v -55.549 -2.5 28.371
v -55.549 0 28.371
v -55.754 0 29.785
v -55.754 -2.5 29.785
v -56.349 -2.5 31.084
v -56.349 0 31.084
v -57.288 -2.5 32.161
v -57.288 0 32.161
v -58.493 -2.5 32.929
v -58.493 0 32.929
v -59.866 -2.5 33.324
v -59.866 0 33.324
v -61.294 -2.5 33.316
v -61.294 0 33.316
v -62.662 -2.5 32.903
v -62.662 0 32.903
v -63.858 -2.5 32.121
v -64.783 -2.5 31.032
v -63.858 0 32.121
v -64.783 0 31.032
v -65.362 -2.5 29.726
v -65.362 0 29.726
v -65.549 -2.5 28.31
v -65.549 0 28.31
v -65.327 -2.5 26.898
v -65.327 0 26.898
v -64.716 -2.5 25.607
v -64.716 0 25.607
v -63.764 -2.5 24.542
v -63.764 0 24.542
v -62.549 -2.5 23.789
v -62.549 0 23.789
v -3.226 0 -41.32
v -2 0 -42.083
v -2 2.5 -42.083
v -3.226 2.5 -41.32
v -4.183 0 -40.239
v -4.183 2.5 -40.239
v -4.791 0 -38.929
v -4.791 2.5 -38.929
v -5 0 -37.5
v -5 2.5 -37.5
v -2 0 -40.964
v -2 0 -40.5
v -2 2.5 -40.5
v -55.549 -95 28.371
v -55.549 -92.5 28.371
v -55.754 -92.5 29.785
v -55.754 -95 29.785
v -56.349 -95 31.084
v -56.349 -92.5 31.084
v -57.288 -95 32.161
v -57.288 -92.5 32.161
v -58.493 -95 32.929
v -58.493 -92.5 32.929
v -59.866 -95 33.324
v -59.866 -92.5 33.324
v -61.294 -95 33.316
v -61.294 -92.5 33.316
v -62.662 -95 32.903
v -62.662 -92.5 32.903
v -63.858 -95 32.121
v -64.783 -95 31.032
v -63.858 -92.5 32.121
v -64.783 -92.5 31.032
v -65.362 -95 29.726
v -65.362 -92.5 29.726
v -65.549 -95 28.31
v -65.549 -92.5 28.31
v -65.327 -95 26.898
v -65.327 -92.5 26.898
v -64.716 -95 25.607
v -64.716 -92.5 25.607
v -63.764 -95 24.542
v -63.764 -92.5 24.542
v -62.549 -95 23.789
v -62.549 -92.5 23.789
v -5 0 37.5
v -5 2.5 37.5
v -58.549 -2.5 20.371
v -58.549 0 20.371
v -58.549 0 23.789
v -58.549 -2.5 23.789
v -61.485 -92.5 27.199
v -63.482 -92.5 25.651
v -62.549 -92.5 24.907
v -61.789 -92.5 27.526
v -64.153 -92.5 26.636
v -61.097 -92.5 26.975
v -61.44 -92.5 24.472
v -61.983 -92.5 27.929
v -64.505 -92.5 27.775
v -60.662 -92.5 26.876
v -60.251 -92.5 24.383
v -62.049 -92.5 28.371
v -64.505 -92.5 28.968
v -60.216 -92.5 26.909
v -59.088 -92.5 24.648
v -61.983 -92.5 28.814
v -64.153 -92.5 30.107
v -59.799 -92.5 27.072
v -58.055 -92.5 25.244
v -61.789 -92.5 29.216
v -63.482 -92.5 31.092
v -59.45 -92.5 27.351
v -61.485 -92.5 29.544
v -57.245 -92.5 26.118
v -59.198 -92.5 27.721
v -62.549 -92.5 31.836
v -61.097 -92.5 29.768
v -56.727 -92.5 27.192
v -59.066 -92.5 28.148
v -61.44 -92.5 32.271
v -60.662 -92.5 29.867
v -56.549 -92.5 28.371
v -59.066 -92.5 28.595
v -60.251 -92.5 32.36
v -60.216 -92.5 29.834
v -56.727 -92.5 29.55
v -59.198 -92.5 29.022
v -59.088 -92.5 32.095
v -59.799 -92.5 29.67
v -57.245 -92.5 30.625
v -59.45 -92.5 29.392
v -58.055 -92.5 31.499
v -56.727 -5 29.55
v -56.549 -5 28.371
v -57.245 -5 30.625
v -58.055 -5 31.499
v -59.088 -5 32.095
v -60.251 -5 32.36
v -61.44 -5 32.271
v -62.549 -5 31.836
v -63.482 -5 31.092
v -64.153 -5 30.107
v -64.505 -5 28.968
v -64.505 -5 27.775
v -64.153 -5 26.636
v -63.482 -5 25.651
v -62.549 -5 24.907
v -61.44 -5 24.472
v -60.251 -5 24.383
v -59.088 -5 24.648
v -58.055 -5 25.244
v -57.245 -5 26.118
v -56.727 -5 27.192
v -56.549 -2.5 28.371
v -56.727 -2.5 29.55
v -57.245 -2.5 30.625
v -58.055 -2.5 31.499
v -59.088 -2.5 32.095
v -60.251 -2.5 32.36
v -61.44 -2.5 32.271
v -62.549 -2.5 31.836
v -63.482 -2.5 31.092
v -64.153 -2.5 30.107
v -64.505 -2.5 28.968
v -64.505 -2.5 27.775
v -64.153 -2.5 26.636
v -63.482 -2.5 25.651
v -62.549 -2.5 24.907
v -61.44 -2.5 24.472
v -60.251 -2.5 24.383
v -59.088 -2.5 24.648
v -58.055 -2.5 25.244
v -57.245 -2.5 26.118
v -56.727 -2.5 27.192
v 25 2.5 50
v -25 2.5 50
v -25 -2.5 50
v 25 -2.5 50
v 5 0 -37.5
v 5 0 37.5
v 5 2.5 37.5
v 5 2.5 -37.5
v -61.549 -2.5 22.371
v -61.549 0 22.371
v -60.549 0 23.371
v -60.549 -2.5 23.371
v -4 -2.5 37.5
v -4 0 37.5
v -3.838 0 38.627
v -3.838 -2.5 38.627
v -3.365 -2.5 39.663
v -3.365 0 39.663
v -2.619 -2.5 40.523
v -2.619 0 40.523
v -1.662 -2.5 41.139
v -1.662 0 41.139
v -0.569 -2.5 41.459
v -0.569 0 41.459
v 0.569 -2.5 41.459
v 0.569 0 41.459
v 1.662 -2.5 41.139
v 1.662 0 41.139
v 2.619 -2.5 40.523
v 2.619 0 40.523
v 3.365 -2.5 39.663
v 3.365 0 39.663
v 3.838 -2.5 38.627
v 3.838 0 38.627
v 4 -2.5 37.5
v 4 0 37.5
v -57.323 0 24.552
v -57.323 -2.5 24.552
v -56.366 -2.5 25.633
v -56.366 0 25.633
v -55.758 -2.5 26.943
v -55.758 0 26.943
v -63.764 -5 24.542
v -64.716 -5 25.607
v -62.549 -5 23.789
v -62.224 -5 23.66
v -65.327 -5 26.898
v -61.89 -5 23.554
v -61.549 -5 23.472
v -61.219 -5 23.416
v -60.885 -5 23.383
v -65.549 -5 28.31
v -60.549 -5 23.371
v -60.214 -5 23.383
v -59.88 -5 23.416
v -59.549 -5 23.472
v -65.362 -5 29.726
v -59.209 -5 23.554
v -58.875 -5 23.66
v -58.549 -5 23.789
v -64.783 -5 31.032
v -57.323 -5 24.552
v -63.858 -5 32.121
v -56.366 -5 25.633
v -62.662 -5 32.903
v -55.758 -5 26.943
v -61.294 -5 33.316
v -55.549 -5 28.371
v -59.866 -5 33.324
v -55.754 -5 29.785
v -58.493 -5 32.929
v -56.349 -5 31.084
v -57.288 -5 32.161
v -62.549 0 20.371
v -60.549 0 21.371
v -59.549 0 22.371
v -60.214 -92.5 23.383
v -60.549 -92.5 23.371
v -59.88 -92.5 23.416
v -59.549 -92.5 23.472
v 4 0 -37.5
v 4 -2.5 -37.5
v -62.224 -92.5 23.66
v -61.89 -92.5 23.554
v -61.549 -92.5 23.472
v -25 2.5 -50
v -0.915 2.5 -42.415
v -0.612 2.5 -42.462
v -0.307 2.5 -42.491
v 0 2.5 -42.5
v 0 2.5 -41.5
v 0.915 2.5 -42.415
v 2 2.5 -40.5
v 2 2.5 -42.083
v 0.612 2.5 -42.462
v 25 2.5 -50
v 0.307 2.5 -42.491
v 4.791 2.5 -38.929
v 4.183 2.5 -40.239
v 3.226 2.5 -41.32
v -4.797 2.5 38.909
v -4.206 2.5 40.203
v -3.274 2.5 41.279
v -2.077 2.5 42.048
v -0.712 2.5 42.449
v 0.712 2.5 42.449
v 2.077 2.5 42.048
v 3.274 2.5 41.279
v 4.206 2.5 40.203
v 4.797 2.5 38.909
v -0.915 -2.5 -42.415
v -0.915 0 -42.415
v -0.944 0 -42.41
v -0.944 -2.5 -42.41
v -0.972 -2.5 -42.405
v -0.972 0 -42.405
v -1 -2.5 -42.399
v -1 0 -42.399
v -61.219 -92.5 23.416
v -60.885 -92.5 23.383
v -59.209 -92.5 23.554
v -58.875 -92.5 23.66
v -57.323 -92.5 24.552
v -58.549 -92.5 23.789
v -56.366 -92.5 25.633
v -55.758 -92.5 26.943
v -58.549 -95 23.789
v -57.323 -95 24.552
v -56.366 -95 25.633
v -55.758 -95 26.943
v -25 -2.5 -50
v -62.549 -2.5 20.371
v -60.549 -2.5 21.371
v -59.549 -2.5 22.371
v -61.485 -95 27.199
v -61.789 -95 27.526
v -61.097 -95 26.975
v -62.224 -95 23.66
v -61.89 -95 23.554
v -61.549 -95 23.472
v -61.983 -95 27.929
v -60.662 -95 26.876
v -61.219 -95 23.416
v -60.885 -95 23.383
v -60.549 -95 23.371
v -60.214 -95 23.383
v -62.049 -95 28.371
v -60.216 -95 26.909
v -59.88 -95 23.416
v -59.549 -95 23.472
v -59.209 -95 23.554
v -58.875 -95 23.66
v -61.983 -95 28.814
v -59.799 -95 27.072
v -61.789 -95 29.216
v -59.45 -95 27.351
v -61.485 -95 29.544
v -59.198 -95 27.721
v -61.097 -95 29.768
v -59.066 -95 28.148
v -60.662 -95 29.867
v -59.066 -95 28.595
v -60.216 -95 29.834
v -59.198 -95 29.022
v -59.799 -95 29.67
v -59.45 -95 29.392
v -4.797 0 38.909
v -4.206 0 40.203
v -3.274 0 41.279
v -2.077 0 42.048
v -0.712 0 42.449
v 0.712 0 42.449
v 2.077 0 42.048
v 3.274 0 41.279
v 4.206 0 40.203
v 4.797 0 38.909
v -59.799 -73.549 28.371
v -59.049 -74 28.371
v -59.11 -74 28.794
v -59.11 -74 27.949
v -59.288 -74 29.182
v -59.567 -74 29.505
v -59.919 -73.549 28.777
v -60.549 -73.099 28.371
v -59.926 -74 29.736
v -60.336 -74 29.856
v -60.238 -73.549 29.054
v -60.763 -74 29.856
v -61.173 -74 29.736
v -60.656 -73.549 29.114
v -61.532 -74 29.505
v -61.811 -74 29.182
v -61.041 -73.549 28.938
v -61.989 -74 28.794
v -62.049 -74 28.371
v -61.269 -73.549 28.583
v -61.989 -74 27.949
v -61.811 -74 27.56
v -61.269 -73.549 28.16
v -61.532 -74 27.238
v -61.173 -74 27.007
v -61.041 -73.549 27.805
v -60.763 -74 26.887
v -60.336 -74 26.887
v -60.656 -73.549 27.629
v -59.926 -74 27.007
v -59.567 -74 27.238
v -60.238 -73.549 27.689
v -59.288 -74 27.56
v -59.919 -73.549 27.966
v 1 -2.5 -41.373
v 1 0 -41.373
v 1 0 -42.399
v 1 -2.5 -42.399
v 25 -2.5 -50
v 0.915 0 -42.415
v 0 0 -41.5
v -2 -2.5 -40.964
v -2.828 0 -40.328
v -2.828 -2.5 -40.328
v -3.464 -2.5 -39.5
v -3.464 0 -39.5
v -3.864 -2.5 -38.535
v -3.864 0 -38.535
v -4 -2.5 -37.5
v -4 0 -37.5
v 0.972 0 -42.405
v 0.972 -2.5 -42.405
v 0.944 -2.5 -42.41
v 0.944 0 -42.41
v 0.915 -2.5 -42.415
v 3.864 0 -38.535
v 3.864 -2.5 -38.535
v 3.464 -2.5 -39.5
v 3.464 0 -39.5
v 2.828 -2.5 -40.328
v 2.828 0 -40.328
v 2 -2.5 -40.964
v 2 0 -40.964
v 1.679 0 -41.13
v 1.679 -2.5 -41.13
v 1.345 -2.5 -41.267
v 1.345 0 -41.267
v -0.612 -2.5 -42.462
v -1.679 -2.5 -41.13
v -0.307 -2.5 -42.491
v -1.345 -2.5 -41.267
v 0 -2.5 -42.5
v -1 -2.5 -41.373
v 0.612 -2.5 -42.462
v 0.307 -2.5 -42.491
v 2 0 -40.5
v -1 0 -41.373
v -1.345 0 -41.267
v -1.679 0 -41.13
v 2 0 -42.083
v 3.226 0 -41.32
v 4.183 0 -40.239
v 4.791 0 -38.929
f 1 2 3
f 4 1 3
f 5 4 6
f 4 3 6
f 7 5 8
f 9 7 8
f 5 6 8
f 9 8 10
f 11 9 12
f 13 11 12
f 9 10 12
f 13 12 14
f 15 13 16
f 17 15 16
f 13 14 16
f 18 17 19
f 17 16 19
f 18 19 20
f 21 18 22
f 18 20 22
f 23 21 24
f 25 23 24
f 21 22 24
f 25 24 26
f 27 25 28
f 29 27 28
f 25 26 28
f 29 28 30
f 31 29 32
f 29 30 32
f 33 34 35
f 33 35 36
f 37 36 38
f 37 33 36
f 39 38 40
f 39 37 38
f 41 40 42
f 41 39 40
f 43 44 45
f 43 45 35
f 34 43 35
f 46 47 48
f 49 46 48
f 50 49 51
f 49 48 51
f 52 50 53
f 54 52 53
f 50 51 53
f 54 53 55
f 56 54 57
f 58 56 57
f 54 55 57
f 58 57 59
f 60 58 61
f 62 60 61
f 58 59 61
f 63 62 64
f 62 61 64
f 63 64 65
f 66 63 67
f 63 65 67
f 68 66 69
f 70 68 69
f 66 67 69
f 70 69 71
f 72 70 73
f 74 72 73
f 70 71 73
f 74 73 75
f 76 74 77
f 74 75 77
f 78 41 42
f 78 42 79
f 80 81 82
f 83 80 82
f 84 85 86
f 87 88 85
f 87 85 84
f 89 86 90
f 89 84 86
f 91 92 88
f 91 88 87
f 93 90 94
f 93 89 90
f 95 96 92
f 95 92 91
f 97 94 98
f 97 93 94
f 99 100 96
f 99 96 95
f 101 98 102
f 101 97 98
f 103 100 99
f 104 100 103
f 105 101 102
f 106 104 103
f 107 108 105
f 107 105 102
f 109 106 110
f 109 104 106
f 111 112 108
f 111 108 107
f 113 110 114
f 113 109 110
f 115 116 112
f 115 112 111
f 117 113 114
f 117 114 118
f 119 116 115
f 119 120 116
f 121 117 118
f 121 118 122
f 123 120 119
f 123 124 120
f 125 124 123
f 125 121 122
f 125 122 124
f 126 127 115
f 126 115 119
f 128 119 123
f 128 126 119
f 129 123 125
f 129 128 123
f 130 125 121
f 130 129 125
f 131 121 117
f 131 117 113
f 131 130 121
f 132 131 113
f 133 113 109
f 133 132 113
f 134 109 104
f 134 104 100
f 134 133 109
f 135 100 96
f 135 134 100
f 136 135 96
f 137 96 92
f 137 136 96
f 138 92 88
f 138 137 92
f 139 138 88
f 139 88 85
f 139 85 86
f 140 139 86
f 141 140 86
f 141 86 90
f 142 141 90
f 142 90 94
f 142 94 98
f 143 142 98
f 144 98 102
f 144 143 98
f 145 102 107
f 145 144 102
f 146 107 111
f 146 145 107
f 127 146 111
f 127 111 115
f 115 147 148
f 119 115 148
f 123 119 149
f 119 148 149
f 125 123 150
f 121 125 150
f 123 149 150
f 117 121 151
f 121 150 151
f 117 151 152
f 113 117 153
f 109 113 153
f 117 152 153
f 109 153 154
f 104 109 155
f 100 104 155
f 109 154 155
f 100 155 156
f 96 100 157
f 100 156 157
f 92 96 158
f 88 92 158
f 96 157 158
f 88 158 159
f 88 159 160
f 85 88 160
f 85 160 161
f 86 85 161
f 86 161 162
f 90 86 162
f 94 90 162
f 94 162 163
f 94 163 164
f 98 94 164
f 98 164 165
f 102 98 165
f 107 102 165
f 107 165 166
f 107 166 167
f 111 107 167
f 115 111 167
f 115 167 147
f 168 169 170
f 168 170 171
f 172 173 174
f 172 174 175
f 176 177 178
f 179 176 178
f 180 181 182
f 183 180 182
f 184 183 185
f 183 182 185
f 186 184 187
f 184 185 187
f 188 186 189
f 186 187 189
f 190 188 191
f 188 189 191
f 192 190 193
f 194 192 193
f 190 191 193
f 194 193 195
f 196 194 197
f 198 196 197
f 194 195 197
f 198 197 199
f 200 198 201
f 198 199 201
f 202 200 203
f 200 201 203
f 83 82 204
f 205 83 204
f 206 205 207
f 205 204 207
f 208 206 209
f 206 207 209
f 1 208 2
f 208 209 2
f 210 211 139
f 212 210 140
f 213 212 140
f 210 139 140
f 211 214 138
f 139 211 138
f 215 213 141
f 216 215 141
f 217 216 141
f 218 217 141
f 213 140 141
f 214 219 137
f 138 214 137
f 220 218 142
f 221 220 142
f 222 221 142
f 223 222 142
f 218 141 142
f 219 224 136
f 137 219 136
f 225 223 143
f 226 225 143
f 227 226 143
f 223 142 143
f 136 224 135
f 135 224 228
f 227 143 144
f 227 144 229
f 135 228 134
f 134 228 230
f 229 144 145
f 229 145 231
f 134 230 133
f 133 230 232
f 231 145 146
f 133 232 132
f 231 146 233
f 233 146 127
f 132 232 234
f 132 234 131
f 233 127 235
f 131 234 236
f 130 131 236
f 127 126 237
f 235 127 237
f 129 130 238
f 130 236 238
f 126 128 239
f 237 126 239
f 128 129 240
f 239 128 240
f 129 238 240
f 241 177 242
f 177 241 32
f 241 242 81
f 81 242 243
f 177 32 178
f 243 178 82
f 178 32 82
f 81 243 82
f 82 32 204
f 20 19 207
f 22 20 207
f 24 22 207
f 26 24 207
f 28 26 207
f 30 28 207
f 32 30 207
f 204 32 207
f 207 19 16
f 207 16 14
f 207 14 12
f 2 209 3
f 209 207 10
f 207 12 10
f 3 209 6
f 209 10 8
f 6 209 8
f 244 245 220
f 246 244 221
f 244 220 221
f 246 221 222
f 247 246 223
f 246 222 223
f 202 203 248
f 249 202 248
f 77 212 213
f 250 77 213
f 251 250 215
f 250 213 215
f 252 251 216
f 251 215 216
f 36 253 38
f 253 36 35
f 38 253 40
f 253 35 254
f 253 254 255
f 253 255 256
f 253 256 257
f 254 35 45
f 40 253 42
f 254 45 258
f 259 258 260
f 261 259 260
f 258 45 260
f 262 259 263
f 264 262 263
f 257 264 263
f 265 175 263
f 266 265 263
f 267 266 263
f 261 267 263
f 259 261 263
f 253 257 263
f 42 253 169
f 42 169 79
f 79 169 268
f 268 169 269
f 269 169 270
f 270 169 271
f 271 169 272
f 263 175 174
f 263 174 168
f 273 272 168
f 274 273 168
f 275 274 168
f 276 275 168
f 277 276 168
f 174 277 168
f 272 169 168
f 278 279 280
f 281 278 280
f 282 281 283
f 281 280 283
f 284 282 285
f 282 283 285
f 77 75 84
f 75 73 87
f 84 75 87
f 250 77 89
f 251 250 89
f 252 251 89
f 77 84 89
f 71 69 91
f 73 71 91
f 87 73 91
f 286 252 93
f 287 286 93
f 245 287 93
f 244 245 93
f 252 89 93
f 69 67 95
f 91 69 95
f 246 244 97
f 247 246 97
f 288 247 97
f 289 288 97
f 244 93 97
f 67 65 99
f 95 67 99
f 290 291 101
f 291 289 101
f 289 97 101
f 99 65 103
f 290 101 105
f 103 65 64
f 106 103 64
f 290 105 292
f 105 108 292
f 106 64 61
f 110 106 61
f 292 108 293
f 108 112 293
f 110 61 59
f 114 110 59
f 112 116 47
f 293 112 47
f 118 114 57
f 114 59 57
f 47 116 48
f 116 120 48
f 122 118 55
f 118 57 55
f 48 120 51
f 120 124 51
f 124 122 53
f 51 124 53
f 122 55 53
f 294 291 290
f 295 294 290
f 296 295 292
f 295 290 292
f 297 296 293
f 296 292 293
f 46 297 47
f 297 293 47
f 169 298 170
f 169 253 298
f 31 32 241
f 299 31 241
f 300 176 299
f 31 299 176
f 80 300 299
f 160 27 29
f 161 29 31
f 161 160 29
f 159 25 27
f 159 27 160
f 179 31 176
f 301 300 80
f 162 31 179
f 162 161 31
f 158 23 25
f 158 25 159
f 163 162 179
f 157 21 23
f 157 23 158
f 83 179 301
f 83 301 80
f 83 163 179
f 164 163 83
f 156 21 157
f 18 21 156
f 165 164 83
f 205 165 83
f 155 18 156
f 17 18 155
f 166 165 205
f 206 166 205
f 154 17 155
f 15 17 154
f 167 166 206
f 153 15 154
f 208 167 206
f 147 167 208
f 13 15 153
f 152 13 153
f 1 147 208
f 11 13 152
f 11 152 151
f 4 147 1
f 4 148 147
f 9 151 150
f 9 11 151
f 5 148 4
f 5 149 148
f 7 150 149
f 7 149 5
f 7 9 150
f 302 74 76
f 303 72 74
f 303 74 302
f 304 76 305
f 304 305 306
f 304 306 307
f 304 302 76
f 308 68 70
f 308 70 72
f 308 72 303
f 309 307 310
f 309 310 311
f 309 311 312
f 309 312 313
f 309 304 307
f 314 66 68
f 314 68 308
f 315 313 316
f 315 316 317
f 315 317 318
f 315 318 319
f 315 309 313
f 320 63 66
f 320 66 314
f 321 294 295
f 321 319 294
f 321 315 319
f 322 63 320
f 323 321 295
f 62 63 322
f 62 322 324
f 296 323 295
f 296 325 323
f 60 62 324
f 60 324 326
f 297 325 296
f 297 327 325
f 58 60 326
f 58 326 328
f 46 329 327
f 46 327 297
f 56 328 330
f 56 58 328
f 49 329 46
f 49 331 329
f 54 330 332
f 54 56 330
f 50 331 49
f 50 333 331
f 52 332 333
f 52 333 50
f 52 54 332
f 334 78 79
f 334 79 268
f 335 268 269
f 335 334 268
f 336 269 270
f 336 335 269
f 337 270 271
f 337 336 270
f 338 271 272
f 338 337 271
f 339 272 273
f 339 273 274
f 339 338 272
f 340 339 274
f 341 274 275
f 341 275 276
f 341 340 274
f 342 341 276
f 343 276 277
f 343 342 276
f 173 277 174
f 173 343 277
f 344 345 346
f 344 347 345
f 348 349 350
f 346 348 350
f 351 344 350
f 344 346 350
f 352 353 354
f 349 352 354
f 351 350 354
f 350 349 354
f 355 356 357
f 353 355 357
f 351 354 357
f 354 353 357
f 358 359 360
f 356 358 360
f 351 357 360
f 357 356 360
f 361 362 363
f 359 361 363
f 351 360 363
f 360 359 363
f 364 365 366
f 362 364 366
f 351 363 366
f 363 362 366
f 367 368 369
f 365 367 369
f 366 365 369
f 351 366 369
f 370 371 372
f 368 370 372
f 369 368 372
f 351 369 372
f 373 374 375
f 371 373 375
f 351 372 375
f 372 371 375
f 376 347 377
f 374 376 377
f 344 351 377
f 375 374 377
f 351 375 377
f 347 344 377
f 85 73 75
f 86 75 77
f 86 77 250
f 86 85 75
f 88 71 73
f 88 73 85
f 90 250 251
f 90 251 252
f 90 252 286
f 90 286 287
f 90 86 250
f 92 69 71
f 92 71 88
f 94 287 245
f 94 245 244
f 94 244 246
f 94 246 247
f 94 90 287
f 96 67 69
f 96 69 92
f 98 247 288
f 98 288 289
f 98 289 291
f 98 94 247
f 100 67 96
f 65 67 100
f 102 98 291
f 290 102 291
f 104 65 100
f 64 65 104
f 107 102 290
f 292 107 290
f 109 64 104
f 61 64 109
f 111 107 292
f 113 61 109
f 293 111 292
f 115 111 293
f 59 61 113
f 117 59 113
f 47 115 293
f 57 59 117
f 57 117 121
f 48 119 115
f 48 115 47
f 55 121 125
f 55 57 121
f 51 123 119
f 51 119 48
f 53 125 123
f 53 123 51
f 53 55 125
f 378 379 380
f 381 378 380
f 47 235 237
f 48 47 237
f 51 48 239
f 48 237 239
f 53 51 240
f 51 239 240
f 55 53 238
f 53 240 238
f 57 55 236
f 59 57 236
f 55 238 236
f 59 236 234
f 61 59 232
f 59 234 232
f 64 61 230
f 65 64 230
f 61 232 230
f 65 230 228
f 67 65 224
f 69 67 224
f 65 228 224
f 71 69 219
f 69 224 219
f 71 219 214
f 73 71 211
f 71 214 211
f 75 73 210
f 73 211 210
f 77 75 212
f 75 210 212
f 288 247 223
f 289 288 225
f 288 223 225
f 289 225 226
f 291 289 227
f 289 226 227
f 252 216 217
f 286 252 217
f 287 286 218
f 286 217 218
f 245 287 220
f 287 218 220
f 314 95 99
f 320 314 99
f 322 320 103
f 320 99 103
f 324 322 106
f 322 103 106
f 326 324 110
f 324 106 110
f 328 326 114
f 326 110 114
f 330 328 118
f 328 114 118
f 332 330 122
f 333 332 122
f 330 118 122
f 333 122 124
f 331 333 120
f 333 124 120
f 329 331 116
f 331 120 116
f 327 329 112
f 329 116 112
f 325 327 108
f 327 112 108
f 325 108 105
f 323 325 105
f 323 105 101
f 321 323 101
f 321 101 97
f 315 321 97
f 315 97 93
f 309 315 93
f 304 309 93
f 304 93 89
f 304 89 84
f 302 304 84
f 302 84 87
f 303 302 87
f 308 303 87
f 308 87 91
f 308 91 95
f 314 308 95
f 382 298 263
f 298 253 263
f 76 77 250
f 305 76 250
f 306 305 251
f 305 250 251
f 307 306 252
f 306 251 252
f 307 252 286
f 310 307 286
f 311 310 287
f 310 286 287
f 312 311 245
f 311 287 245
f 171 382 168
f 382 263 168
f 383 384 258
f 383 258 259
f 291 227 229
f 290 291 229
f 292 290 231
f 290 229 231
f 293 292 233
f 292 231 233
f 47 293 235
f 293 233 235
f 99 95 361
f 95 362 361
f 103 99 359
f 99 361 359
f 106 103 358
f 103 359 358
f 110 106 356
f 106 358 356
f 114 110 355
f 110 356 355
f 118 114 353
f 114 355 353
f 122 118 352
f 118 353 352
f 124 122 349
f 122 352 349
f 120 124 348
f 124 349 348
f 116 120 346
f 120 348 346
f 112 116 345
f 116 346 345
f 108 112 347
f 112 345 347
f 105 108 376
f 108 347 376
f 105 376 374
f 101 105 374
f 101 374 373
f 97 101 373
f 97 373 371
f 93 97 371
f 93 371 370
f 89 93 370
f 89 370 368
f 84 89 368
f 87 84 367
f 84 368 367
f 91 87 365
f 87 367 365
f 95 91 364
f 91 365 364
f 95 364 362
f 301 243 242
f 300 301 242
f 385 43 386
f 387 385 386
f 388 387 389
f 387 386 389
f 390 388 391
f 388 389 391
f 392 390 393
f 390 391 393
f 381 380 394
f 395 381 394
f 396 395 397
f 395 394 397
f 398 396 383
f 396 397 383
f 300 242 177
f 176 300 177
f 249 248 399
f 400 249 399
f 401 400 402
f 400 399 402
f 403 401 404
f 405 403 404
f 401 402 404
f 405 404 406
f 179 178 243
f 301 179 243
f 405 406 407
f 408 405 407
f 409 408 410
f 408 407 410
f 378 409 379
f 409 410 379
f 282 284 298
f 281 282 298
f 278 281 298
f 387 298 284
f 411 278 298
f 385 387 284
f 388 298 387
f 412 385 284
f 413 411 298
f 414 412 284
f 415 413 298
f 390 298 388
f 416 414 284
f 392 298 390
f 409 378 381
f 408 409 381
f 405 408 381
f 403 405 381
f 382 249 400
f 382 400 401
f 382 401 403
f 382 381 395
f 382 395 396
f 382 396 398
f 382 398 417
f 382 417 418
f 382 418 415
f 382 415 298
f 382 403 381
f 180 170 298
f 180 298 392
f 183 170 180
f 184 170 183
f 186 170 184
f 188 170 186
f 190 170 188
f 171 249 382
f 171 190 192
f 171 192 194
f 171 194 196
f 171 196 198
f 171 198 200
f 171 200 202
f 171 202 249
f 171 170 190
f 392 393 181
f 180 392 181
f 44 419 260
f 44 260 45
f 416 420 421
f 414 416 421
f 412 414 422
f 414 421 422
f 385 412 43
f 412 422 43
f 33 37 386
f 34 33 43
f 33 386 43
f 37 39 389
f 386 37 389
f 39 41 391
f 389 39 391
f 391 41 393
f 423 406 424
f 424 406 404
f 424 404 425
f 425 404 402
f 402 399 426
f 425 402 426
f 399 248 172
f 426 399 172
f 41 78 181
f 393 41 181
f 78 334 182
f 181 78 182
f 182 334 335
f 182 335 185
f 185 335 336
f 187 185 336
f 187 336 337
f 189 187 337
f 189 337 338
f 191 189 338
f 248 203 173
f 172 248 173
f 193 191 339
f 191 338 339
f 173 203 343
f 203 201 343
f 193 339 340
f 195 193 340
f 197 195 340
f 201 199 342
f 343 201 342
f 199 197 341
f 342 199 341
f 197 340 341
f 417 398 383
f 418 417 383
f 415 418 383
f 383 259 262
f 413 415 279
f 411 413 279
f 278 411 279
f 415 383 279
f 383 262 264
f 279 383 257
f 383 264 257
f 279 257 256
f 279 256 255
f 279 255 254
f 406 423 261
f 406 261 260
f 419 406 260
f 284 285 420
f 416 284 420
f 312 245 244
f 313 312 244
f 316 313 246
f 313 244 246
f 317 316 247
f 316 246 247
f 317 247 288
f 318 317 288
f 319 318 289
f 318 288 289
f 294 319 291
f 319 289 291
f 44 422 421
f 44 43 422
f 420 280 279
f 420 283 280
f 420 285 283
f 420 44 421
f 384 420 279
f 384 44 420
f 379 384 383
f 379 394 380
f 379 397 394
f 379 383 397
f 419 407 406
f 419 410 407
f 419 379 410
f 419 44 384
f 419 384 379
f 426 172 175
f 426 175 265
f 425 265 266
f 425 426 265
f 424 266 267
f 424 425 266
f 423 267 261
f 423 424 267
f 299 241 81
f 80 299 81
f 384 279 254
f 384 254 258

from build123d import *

# Parameters (mm, degrees)
F0_W      = 50
F0_H      = 100
F1_DEPTH  = 2.5
F2_DEPTH  = 2.5
F3_R      = 4
F4_DEPTH  = 2.5
F5_DEPTH  = 92.5
F7_START  = 5
F7_DEPTH  = 87.5
F8_D      = 3
F8_DEPTH  = 18.5
F8_TIP    = 0.9012909285
F9_START  = 92.5
F9_DEPTH  = 2.5
F11_D     = 3
F11_DEPTH = 18.5
F11_TIP   = 0.9012909285


with BuildPart() as f1:
    # F0 (on Front) → F1 (new body)
    with BuildSketch(Plane.XZ):
        Rectangle(F0_W, F0_H)
        with BuildLine():
            ThreePointArc((-5, 37.5), (0, 42.5), (5, 37.5))
            Line((5, 37.5), (5, -37.5))
            ThreePointArc((5, -37.5), (4.1833001327, -40.2386127875), (2, -42.082575695))
            Line((2, -42.082575695), (2, -42.5))
            Line((2, -42.5), (1, -42.5))
            Line((1, -42.5), (0, -42.5))
            Line((0, -42.5), (-1, -42.5))
            Line((-1, -42.5), (-2, -42.5))
            Line((-2, -42.5), (-2, -42.082575695))
            ThreePointArc((-2, -42.082575695), (-4.1833001327, -40.2386127875), (-5, -37.5))
            Line((-5, -37.5), (-5, 37.5))
        make_face(mode=Mode.SUBTRACT)
        with BuildLine():
            ThreePointArc((0, -42.5), (-0.4596848175, -42.4788241452), (-0.9154759474, -42.4154759474))
            Line((-0.9154759474, -42.4154759474), (-1, -42.5))
            Line((-1, -42.5), (0, -42.5))
        make_face()
        with BuildLine():
            ThreePointArc((-0.9154759474, -42.4154759474), (-0.9577734908, -42.4074096976), (-1, -42.3989794856))
            Line((-1, -42.3989794856), (-1, -42.5))
            Line((-1, -42.5), (-0.9154759474, -42.4154759474))
        make_face()
        with BuildLine():
            Line((1, -42.5), (1, -42.3989794856))
            ThreePointArc((1, -42.3989794856), (0.9577734908, -42.4074096976), (0.9154759474, -42.4154759474))
            Line((0.9154759474, -42.4154759474), (1, -42.5))
        make_face()
        with BuildLine():
            Line((1, -42.5), (0.9154759474, -42.4154759474))
            ThreePointArc((0.9154759474, -42.4154759474), (0.4596848175, -42.4788241452), (0, -42.5))
            Line((0, -42.5), (1, -42.5))
        make_face()
        with BuildLine():
            ThreePointArc((0.9154759474, -42.4154759474), (0.9577734908, -42.4074096976), (1, -42.3989794856))
            Line((1, -42.3989794856), (1, -41.3729833462))
            ThreePointArc((1, -41.3729833462), (0.5040171699, -41.4681187851), (0, -41.5))
            Line((0, -41.5), (0.9154759474, -42.4154759474))
        make_face()
        with BuildLine():
            ThreePointArc((0, -41.5), (0.5040171699, -41.4681187851), (1, -41.3729833462))
            Line((1, -41.3729833462), (1, -40.5))
            Line((1, -40.5), (0, -40.5))
            Line((0, -40.5), (0, -41.5))
        make_face()
        with BuildLine():
            Line((-1, -40.5), (-1, -41.3729833462))
            ThreePointArc((-1, -41.3729833462), (-0.5040171699, -41.4681187851), (0, -41.5))
            Line((0, -41.5), (0, -40.5))
            Line((0, -40.5), (-1, -40.5))
        make_face()
        with BuildLine():
            Line((-1, -41.3729833462), (-1, -42.3989794856))
            ThreePointArc((-1, -42.3989794856), (-0.9577734908, -42.4074096976), (-0.9154759474, -42.4154759474))
            Line((-0.9154759474, -42.4154759474), (0, -41.5))
            ThreePointArc((0, -41.5), (-0.5040171699, -41.4681187851), (-1, -41.3729833462))
        make_face()
        with BuildLine():
            Line((-2, -40.5), (-2, -40.9641016151))
            ThreePointArc((-2, -40.9641016151), (-1.5138679161, -41.2024591736), (-1, -41.3729833462))
            Line((-1, -41.3729833462), (-1, -40.5))
            Line((-1, -40.5), (-2, -40.5))
        make_face()
        with BuildLine():
            Line((-2, -40.9641016151), (-2, -42.082575695))
            ThreePointArc((-2, -42.082575695), (-1.5083195416, -42.2670716546), (-1, -42.3989794856))
            Line((-1, -42.3989794856), (-1, -41.3729833462))
            ThreePointArc((-1, -41.3729833462), (-1.5138679161, -41.2024591736), (-2, -40.9641016151))
        make_face()
        with BuildLine():
            ThreePointArc((-1, -42.3989794856), (-1.5083195416, -42.2670716546), (-2, -42.082575695))
            Line((-2, -42.082575695), (-2, -42.5))
            Line((-2, -42.5), (-1, -42.5))
            Line((-1, -42.5), (-1, -42.3989794856))
        make_face()
        with BuildLine():
            ThreePointArc((1, -41.3729833462), (1.5138679161, -41.2024591736), (2, -40.9641016151))
            Line((2, -40.9641016151), (2, -40.5))
            Line((2, -40.5), (1, -40.5))
            Line((1, -40.5), (1, -41.3729833462))
        make_face()
        with BuildLine():
            ThreePointArc((1, -42.3989794856), (1.5083195416, -42.2670716546), (2, -42.082575695))
            Line((2, -42.082575695), (2, -40.9641016151))
            ThreePointArc((2, -40.9641016151), (1.5138679161, -41.2024591736), (1, -41.3729833462))
            Line((1, -41.3729833462), (1, -42.3989794856))
        make_face()
        with BuildLine():
            Line((2, -42.5), (2, -42.082575695))
            ThreePointArc((2, -42.082575695), (1.5083195416, -42.2670716546), (1, -42.3989794856))
            Line((1, -42.3989794856), (1, -42.5))
            Line((1, -42.5), (2, -42.5))
        make_face()
    extrude(amount=-F1_DEPTH)

    # F0 (on Front) → F2 (join)
    with BuildSketch(Plane.XZ):
        Rectangle(F0_W, F0_H)
        with BuildLine():
            ThreePointArc((-5, 37.5), (0, 42.5), (5, 37.5))
            Line((5, 37.5), (5, -37.5))
            ThreePointArc((5, -37.5), (4.1833001327, -40.2386127875), (2, -42.082575695))
            Line((2, -42.082575695), (2, -42.5))
            Line((2, -42.5), (1, -42.5))
            Line((1, -42.5), (0, -42.5))
            Line((0, -42.5), (-1, -42.5))
            Line((-1, -42.5), (-2, -42.5))
            Line((-2, -42.5), (-2, -42.082575695))
            ThreePointArc((-2, -42.082575695), (-4.1833001327, -40.2386127875), (-5, -37.5))
            Line((-5, -37.5), (-5, 37.5))
        make_face(mode=Mode.SUBTRACT)
        with BuildLine():
            Line((5, -37.5), (5, 37.5))
            ThreePointArc((5, 37.5), (0, 42.5), (-5, 37.5))
            Line((-5, 37.5), (-5, -37.5))
            ThreePointArc((-5, -37.5), (-4.1833001327, -40.2386127875), (-2, -42.082575695))
            Line((-2, -42.082575695), (-2, -40.9641016151))
            ThreePointArc((-2, -40.9641016151), (-3.4641016151, -39.5), (-4, -37.5))
            Line((-4, -37.5), (-4, 37.5))
            ThreePointArc((-4, 37.5), (0, 41.5), (4, 37.5))
            Line((4, 37.5), (4, -37.5))
            ThreePointArc((4, -37.5), (3.4641016151, -39.5), (2, -40.9641016151))
            Line((2, -40.9641016151), (2, -42.082575695))
            ThreePointArc((2, -42.082575695), (4.1833001327, -40.2386127875), (5, -37.5))
        make_face()
        with BuildLine():
            Line((-2, -40.9641016151), (-2, -42.082575695))
            ThreePointArc((-2, -42.082575695), (-1.5083195416, -42.2670716546), (-1, -42.3989794856))
            Line((-1, -42.3989794856), (-1, -41.3729833462))
            ThreePointArc((-1, -41.3729833462), (-1.5138679161, -41.2024591736), (-2, -40.9641016151))
        make_face()
        with BuildLine():
            ThreePointArc((1, -42.3989794856), (1.5083195416, -42.2670716546), (2, -42.082575695))
            Line((2, -42.082575695), (2, -40.9641016151))
            ThreePointArc((2, -40.9641016151), (1.5138679161, -41.2024591736), (1, -41.3729833462))
            Line((1, -41.3729833462), (1, -42.3989794856))
        make_face()
        with BuildLine():
            Line((2, -42.5), (2, -42.082575695))
            ThreePointArc((2, -42.082575695), (1.5083195416, -42.2670716546), (1, -42.3989794856))
            Line((1, -42.3989794856), (1, -42.5))
            Line((1, -42.5), (2, -42.5))
        make_face()
        with BuildLine():
            ThreePointArc((-1, -42.3989794856), (-1.5083195416, -42.2670716546), (-2, -42.082575695))
            Line((-2, -42.082575695), (-2, -42.5))
            Line((-2, -42.5), (-1, -42.5))
            Line((-1, -42.5), (-1, -42.3989794856))
        make_face()
        with BuildLine():
            ThreePointArc((-0.9154759474, -42.4154759474), (-0.9577734908, -42.4074096976), (-1, -42.3989794856))
            Line((-1, -42.3989794856), (-1, -42.5))
            Line((-1, -42.5), (-0.9154759474, -42.4154759474))
        make_face()
        with BuildLine():
            ThreePointArc((0, -42.5), (-0.4596848175, -42.4788241452), (-0.9154759474, -42.4154759474))
            Line((-0.9154759474, -42.4154759474), (-1, -42.5))
            Line((-1, -42.5), (0, -42.5))
        make_face()
        with BuildLine():
            Line((1, -42.5), (1, -42.3989794856))
            ThreePointArc((1, -42.3989794856), (0.9577734908, -42.4074096976), (0.9154759474, -42.4154759474))
            Line((0.9154759474, -42.4154759474), (1, -42.5))
        make_face()
        with BuildLine():
            Line((1, -42.5), (0.9154759474, -42.4154759474))
            ThreePointArc((0.9154759474, -42.4154759474), (0.4596848175, -42.4788241452), (0, -42.5))
            Line((0, -42.5), (1, -42.5))
        make_face()
    extrude(amount=F2_DEPTH)


with BuildPart() as f4:
    # F3 (on Front) → F4 (new body)
    with BuildSketch(Plane.XZ):
        with BuildLine():
            ThreePointArc((-58.5494586527, 23.7888430792), (-56.3661585201, 25.6328059866), (-55.5494586527, 28.3714187741))
            ThreePointArc((-55.5494586527, 28.3714187741), (-63.2880714403, 32.5547189068), (-62.5494586527, 23.7888430792))
            ThreePointArc((-62.5494586527, 23.7888430792), (-62.0577781944, 23.6043471195), (-61.5494586527, 23.4724392886))
            ThreePointArc((-61.5494586527, 23.4724392886), (-61.0520034628, 23.3967380091), (-60.5494586527, 23.3714187741))
            ThreePointArc((-60.5494586527, 23.3714187741), (-60.0469138427, 23.3967380091), (-59.5494586527, 23.4724392886))
            ThreePointArc((-59.5494586527, 23.4724392886), (-59.0411391111, 23.6043471195), (-58.5494586527, 23.7888430792))
        make_face()
        with Locations((-60.5494586527, 28.3714187741)):
            Circle(F3_R, mode=Mode.SUBTRACT)
        with BuildLine():
            ThreePointArc((-61.5494586527, 23.4724392886), (-62.0577781944, 23.6043471195), (-62.5494586527, 23.7888430792))
            Line((-62.5494586527, 23.7888430792), (-62.5494586527, 21.3714187741))
            Line((-62.5494586527, 21.3714187741), (-61.5494586527, 21.3714187741))
            Line((-61.5494586527, 21.3714187741), (-61.5494586527, 22.3714187741))
            Line((-61.5494586527, 22.3714187741), (-61.5494586527, 23.4724392886))
        make_face()
        with BuildLine():
            Line((-58.5494586527, 21.3714187741), (-58.5494586527, 23.7888430792))
            ThreePointArc((-58.5494586527, 23.7888430792), (-59.0411391111, 23.6043471195), (-59.5494586527, 23.4724392886))
            Line((-59.5494586527, 23.4724392886), (-59.5494586527, 22.3714187741))
            Line((-59.5494586527, 22.3714187741), (-59.5494586527, 21.3714187741))
            Line((-59.5494586527, 21.3714187741), (-58.5494586527, 21.3714187741))
        make_face()
        Polygon((-61.5494586527, 21.3714187741), (-62.5494586527, 21.3714187741), (-62.5494586527, 20.3714187741), (-58.5494586527, 20.3714187741), (-58.5494586527, 21.3714187741), (-59.5494586527, 21.3714187741), (-60.5494586527, 21.3714187741), align=None)
        Polygon((-60.5494586527, 21.3714187741), (-61.5494586527, 22.3714187741), (-61.5494586527, 21.3714187741), align=None)
        with BuildLine():
            ThreePointArc((-60.5494586527, 23.3714187741), (-61.0520034628, 23.3967380091), (-61.5494586527, 23.4724392886))
            Line((-61.5494586527, 23.4724392886), (-61.5494586527, 22.3714187741))
            Line((-61.5494586527, 22.3714187741), (-60.5494586527, 23.3714187741))
        make_face()
        with BuildLine():
            Line((-59.5494586527, 22.3714187741), (-59.5494586527, 23.4724392886))
            ThreePointArc((-59.5494586527, 23.4724392886), (-60.0469138427, 23.3967380091), (-60.5494586527, 23.3714187741))
            Line((-60.5494586527, 23.3714187741), (-59.5494586527, 22.3714187741))
        make_face()
        Polygon((-59.5494586527, 21.3714187741), (-59.5494586527, 22.3714187741), (-60.5494586527, 21.3714187741), align=None)
    extrude(amount=F4_DEPTH)

    # F3 (on Front) → F5 (join)
    with BuildSketch(Plane.XZ):
        with Locations((-60.5494586527, 28.3714187741)):
            Circle(F3_R)
    extrude(amount=F5_DEPTH)

    # F8
    with Locations(Plane.XZ.offset(92.5)):
        with Locations((-60.5494586527, 28.3714187741)):
            Hole(F8_D / 2, depth=F8_DEPTH)
            with Locations((0, 0, -(F8_DEPTH + F8_TIP / 2))):  # 118° drill point
                Cone(0, F8_D / 2, F8_TIP, mode=Mode.SUBTRACT)


with BuildPart() as f7:
    # F3 (on Front) → F7 (new body)
    with BuildSketch(Plane.XZ.offset(F7_START)):
        with BuildLine():
            ThreePointArc((-58.5494586527, 23.7888430792), (-56.3661585201, 25.6328059866), (-55.5494586527, 28.3714187741))
            ThreePointArc((-55.5494586527, 28.3714187741), (-63.2880714403, 32.5547189068), (-62.5494586527, 23.7888430792))
            ThreePointArc((-62.5494586527, 23.7888430792), (-62.0577781944, 23.6043471195), (-61.5494586527, 23.4724392886))
            ThreePointArc((-61.5494586527, 23.4724392886), (-61.0520034628, 23.3967380091), (-60.5494586527, 23.3714187741))
            ThreePointArc((-60.5494586527, 23.3714187741), (-60.0469138427, 23.3967380091), (-59.5494586527, 23.4724392886))
            ThreePointArc((-59.5494586527, 23.4724392886), (-59.0411391111, 23.6043471195), (-58.5494586527, 23.7888430792))
        make_face()
        with Locations((-60.5494586527, 28.3714187741)):
            Circle(F3_R, mode=Mode.SUBTRACT)
    extrude(amount=F7_DEPTH)


with BuildPart() as f9:
    # F3 (on Front) → F9 (new body)
    with BuildSketch(Plane.XZ.offset(F9_START)):
        with BuildLine():
            ThreePointArc((-58.5494586527, 23.7888430792), (-56.3661585201, 25.6328059866), (-55.5494586527, 28.3714187741))
            ThreePointArc((-55.5494586527, 28.3714187741), (-63.2880714403, 32.5547189068), (-62.5494586527, 23.7888430792))
            ThreePointArc((-62.5494586527, 23.7888430792), (-62.0577781944, 23.6043471195), (-61.5494586527, 23.4724392886))
            ThreePointArc((-61.5494586527, 23.4724392886), (-61.0520034628, 23.3967380091), (-60.5494586527, 23.3714187741))
            ThreePointArc((-60.5494586527, 23.3714187741), (-60.0469138427, 23.3967380091), (-59.5494586527, 23.4724392886))
            ThreePointArc((-59.5494586527, 23.4724392886), (-59.0411391111, 23.6043471195), (-58.5494586527, 23.7888430792))
        make_face()
        with Locations((-60.5494586527, 28.3714187741)):
            Circle(F3_R, mode=Mode.SUBTRACT)
        with Locations((-60.5494586527, 28.3714187741)):
            Circle(F3_R)
    extrude(amount=F9_DEPTH)

    # F11
    with Locations(Plane.XZ.offset(95)):
        with Locations((-60.5494586527, 28.3714187741)):
            Hole(F11_D / 2, depth=F11_DEPTH)
            with Locations((0, 0, -(F11_DEPTH + F11_TIP / 2))):  # 118° drill point
                Cone(0, F11_D / 2, F11_TIP, mode=Mode.SUBTRACT)


solid = Compound([f1.part, f4.part, f7.part, f9.part])
